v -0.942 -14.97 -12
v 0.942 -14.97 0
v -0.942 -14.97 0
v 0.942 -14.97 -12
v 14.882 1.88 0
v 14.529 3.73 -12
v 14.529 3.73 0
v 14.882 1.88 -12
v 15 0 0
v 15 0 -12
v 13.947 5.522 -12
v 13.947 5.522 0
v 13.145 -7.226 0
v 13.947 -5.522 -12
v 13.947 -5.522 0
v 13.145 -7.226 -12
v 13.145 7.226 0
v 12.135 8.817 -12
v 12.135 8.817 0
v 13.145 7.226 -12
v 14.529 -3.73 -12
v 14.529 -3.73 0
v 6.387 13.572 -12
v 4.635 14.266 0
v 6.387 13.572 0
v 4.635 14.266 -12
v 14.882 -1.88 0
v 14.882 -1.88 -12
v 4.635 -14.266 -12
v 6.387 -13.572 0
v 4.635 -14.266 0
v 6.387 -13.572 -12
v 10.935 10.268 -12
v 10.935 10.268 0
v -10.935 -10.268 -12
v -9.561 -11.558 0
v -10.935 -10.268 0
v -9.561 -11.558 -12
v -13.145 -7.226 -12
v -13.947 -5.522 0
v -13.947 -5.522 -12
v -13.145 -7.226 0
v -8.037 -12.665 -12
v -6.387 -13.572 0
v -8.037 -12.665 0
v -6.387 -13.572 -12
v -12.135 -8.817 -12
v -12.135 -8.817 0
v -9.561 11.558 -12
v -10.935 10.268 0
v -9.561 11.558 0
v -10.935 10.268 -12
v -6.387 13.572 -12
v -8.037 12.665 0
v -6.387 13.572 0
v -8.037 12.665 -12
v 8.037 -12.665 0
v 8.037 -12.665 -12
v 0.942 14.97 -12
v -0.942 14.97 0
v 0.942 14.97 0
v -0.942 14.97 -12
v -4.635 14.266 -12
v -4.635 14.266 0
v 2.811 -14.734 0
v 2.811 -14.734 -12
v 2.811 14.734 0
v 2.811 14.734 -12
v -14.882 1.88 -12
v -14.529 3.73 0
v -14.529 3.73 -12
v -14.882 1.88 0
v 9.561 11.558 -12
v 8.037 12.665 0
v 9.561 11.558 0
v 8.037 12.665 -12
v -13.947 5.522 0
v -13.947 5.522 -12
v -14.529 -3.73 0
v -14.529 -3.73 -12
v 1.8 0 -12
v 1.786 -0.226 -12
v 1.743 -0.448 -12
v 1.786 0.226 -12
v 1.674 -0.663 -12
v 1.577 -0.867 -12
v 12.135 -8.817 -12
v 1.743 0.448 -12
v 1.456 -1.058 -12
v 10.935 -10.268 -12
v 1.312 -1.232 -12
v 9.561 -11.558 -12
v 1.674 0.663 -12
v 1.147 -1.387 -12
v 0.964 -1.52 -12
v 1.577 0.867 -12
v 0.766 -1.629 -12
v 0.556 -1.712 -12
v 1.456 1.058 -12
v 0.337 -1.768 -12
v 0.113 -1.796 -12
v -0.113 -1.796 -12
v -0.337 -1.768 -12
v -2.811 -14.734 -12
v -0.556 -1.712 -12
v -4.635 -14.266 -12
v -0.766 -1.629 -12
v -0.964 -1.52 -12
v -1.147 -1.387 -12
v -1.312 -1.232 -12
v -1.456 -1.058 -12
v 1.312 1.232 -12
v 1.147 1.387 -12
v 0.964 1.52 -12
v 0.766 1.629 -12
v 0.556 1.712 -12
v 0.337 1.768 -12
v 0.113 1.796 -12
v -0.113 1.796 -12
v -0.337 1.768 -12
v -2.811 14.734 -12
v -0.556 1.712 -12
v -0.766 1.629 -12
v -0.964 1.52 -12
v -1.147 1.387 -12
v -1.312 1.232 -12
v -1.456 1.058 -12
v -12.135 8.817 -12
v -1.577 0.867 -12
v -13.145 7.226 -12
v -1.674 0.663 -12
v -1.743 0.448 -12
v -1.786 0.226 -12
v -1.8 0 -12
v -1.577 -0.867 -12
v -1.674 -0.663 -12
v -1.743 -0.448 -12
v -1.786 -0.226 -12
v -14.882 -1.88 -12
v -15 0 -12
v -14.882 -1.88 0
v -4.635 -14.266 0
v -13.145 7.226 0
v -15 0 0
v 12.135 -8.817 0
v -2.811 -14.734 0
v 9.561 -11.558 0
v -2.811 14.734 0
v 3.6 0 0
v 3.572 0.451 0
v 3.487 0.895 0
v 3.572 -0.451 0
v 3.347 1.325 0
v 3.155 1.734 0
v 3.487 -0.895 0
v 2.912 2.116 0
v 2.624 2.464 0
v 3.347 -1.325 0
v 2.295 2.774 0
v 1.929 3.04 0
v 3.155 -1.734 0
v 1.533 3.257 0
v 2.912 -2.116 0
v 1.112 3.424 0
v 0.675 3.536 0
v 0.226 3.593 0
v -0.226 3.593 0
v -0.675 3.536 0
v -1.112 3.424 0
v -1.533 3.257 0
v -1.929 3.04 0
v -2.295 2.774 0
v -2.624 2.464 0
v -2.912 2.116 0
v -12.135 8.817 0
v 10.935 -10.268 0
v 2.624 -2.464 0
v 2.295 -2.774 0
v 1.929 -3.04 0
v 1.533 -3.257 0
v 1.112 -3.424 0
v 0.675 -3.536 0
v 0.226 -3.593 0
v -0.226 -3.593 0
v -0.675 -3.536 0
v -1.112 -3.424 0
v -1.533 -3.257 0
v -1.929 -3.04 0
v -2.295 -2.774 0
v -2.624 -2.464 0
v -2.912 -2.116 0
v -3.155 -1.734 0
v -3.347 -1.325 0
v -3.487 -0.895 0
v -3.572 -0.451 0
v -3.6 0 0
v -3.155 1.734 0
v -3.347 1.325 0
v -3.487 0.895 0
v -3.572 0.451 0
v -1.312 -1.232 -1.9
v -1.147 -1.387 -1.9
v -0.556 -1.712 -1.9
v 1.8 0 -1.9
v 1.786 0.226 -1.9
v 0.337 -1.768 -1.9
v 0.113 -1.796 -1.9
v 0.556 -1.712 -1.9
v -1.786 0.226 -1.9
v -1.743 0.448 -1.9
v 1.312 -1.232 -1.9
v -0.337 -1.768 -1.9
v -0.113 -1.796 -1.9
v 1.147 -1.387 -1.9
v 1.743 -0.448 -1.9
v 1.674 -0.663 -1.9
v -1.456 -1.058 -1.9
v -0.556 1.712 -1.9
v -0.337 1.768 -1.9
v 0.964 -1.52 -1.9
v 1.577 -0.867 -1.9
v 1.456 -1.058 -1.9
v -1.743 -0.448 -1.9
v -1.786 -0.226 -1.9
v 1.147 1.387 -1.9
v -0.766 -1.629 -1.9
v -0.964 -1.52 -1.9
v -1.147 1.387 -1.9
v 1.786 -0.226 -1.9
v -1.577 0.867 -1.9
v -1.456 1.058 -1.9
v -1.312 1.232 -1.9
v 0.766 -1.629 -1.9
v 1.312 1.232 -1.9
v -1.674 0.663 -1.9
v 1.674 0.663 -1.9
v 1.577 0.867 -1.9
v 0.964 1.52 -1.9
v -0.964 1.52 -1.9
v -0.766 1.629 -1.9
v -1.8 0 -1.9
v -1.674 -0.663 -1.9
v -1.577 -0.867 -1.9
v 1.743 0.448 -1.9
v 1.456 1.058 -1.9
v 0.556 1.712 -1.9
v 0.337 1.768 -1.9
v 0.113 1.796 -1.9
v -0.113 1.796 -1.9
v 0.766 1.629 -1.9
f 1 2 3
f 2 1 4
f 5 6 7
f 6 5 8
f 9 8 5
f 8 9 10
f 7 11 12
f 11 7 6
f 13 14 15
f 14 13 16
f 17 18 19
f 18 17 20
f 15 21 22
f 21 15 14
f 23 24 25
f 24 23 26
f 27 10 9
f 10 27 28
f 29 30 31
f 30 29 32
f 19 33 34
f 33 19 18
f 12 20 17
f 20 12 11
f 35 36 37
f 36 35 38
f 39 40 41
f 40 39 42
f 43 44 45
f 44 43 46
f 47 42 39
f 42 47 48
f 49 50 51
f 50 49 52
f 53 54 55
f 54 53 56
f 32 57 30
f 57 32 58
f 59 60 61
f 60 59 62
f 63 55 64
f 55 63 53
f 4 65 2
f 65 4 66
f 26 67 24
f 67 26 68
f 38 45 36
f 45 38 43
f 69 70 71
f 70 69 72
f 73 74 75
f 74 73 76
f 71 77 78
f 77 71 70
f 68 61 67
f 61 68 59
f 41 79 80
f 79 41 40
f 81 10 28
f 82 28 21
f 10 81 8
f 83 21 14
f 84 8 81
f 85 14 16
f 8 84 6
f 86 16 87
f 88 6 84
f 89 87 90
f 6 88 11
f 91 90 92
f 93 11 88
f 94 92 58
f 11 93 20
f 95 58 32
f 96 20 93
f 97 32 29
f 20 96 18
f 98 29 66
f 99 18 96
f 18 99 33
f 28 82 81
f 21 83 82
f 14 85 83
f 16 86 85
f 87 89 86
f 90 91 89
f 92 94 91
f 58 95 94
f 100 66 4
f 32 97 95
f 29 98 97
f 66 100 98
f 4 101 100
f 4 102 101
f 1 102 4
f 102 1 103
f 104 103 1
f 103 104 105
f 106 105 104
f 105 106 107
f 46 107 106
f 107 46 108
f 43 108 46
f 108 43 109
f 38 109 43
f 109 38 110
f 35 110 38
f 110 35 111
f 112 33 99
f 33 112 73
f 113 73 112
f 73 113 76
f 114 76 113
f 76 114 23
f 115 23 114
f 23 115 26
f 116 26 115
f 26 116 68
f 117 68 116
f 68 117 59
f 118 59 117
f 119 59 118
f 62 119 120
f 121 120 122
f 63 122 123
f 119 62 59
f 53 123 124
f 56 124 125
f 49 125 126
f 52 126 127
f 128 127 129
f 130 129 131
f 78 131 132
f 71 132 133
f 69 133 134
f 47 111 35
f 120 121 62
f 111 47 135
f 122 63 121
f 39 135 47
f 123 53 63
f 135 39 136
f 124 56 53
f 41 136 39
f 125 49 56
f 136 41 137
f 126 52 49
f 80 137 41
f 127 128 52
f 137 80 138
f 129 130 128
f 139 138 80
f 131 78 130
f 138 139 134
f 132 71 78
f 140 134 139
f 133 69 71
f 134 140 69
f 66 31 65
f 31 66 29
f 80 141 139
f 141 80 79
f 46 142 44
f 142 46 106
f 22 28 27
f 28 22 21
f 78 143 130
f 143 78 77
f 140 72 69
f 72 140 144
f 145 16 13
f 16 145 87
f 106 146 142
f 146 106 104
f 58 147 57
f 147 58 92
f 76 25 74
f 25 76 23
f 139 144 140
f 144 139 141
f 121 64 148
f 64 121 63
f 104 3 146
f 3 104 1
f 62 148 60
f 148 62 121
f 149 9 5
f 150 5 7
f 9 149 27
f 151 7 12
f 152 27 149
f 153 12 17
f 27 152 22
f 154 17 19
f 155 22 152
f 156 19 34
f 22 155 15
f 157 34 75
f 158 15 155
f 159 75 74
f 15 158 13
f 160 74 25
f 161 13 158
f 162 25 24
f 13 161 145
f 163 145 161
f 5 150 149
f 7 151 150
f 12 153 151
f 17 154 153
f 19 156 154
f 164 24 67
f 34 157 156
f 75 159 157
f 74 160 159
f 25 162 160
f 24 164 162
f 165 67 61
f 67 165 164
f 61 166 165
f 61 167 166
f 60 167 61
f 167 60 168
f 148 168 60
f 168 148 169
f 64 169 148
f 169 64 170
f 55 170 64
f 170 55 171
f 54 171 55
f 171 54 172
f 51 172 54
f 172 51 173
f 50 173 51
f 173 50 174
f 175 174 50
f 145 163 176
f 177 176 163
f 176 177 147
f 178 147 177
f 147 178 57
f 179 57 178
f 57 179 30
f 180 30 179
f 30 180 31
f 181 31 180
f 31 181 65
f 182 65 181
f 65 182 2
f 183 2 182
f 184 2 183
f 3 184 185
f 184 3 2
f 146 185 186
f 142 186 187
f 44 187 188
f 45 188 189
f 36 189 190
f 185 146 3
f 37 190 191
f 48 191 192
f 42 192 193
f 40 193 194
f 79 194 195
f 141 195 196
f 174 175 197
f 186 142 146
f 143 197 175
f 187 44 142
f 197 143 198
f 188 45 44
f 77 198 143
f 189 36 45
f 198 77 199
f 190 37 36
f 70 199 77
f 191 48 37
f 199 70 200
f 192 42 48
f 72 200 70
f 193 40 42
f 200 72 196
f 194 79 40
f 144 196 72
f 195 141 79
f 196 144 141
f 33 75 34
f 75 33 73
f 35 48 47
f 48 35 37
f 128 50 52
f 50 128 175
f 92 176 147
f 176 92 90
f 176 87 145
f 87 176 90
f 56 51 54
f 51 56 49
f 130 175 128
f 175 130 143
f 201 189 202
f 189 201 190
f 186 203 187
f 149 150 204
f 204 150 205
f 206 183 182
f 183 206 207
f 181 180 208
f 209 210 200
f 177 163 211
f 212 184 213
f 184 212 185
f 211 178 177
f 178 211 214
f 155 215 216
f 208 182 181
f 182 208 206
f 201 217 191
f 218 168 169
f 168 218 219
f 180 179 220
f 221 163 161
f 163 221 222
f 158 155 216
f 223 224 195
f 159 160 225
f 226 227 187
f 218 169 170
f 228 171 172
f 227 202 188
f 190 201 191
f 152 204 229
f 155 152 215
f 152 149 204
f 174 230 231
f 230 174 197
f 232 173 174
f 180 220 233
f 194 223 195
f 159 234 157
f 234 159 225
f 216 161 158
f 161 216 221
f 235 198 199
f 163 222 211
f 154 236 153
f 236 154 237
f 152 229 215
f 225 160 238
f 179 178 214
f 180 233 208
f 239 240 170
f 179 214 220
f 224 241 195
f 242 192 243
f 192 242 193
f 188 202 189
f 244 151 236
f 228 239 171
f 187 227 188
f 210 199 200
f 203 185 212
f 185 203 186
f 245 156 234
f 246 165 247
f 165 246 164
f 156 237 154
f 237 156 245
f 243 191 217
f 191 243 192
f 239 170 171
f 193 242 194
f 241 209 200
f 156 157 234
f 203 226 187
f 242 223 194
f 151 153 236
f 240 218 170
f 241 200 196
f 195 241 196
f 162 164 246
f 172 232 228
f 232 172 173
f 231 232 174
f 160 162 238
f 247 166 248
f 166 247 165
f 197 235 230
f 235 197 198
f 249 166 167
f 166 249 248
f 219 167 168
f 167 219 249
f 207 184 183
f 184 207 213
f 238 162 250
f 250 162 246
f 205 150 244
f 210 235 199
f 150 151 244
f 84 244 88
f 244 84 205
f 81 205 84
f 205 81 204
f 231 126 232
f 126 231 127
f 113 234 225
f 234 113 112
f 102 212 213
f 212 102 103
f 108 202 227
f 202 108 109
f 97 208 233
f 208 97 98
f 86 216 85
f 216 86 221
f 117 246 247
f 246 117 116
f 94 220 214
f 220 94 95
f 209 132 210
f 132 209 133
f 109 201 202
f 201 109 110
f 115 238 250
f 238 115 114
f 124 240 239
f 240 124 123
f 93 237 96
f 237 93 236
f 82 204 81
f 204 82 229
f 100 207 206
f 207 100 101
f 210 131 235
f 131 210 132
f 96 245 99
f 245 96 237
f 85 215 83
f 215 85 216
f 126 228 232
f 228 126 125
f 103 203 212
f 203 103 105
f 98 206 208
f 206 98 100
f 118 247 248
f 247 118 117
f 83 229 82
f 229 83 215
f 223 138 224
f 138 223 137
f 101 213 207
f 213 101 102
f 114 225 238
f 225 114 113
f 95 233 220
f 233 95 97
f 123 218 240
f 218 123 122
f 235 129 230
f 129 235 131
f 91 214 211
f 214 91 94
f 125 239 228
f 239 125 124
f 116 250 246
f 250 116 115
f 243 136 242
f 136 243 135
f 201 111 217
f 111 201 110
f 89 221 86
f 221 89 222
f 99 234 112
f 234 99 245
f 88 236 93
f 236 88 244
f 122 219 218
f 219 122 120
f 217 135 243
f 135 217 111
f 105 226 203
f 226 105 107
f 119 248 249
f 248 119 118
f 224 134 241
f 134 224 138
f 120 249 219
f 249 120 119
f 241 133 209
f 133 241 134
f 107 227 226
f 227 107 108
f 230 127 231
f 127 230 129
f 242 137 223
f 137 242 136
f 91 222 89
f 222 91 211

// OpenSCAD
$fn = 50;


difference() {
	union() {
		translate(v = [0, 0, -12.0000000000]) {
			cylinder(h = 12, r = 15.0000000000);
		}
		translate(v = [0, 0, -12.0000000000]) {
			cylinder(h = 12, r = 2.8750000000);
		}
	}
	union() {
		translate(v = [0, 0, 0]) {
			rotate(a = [0, 0, 0]) {
				difference() {
					union() {
						translate(v = [0, 0, -12.0000000000]) {
							cylinder(h = 12, r = 1.5000000000);
						}
						translate(v = [0, 0, -1.9000000000]) {
							cylinder(h = 1.9000000000, r1 = 1.8000000000, r2 = 3.6000000000);
						}
						translate(v = [0, 0, -12.0000000000]) {
							cylinder(h = 12, r = 1.8000000000);
						}
						translate(v = [0, 0, -12.0000000000]) {
							cylinder(h = 12, r = 1.5000000000);
						}
					}
					union();
				}
			}
		}
	}
}
